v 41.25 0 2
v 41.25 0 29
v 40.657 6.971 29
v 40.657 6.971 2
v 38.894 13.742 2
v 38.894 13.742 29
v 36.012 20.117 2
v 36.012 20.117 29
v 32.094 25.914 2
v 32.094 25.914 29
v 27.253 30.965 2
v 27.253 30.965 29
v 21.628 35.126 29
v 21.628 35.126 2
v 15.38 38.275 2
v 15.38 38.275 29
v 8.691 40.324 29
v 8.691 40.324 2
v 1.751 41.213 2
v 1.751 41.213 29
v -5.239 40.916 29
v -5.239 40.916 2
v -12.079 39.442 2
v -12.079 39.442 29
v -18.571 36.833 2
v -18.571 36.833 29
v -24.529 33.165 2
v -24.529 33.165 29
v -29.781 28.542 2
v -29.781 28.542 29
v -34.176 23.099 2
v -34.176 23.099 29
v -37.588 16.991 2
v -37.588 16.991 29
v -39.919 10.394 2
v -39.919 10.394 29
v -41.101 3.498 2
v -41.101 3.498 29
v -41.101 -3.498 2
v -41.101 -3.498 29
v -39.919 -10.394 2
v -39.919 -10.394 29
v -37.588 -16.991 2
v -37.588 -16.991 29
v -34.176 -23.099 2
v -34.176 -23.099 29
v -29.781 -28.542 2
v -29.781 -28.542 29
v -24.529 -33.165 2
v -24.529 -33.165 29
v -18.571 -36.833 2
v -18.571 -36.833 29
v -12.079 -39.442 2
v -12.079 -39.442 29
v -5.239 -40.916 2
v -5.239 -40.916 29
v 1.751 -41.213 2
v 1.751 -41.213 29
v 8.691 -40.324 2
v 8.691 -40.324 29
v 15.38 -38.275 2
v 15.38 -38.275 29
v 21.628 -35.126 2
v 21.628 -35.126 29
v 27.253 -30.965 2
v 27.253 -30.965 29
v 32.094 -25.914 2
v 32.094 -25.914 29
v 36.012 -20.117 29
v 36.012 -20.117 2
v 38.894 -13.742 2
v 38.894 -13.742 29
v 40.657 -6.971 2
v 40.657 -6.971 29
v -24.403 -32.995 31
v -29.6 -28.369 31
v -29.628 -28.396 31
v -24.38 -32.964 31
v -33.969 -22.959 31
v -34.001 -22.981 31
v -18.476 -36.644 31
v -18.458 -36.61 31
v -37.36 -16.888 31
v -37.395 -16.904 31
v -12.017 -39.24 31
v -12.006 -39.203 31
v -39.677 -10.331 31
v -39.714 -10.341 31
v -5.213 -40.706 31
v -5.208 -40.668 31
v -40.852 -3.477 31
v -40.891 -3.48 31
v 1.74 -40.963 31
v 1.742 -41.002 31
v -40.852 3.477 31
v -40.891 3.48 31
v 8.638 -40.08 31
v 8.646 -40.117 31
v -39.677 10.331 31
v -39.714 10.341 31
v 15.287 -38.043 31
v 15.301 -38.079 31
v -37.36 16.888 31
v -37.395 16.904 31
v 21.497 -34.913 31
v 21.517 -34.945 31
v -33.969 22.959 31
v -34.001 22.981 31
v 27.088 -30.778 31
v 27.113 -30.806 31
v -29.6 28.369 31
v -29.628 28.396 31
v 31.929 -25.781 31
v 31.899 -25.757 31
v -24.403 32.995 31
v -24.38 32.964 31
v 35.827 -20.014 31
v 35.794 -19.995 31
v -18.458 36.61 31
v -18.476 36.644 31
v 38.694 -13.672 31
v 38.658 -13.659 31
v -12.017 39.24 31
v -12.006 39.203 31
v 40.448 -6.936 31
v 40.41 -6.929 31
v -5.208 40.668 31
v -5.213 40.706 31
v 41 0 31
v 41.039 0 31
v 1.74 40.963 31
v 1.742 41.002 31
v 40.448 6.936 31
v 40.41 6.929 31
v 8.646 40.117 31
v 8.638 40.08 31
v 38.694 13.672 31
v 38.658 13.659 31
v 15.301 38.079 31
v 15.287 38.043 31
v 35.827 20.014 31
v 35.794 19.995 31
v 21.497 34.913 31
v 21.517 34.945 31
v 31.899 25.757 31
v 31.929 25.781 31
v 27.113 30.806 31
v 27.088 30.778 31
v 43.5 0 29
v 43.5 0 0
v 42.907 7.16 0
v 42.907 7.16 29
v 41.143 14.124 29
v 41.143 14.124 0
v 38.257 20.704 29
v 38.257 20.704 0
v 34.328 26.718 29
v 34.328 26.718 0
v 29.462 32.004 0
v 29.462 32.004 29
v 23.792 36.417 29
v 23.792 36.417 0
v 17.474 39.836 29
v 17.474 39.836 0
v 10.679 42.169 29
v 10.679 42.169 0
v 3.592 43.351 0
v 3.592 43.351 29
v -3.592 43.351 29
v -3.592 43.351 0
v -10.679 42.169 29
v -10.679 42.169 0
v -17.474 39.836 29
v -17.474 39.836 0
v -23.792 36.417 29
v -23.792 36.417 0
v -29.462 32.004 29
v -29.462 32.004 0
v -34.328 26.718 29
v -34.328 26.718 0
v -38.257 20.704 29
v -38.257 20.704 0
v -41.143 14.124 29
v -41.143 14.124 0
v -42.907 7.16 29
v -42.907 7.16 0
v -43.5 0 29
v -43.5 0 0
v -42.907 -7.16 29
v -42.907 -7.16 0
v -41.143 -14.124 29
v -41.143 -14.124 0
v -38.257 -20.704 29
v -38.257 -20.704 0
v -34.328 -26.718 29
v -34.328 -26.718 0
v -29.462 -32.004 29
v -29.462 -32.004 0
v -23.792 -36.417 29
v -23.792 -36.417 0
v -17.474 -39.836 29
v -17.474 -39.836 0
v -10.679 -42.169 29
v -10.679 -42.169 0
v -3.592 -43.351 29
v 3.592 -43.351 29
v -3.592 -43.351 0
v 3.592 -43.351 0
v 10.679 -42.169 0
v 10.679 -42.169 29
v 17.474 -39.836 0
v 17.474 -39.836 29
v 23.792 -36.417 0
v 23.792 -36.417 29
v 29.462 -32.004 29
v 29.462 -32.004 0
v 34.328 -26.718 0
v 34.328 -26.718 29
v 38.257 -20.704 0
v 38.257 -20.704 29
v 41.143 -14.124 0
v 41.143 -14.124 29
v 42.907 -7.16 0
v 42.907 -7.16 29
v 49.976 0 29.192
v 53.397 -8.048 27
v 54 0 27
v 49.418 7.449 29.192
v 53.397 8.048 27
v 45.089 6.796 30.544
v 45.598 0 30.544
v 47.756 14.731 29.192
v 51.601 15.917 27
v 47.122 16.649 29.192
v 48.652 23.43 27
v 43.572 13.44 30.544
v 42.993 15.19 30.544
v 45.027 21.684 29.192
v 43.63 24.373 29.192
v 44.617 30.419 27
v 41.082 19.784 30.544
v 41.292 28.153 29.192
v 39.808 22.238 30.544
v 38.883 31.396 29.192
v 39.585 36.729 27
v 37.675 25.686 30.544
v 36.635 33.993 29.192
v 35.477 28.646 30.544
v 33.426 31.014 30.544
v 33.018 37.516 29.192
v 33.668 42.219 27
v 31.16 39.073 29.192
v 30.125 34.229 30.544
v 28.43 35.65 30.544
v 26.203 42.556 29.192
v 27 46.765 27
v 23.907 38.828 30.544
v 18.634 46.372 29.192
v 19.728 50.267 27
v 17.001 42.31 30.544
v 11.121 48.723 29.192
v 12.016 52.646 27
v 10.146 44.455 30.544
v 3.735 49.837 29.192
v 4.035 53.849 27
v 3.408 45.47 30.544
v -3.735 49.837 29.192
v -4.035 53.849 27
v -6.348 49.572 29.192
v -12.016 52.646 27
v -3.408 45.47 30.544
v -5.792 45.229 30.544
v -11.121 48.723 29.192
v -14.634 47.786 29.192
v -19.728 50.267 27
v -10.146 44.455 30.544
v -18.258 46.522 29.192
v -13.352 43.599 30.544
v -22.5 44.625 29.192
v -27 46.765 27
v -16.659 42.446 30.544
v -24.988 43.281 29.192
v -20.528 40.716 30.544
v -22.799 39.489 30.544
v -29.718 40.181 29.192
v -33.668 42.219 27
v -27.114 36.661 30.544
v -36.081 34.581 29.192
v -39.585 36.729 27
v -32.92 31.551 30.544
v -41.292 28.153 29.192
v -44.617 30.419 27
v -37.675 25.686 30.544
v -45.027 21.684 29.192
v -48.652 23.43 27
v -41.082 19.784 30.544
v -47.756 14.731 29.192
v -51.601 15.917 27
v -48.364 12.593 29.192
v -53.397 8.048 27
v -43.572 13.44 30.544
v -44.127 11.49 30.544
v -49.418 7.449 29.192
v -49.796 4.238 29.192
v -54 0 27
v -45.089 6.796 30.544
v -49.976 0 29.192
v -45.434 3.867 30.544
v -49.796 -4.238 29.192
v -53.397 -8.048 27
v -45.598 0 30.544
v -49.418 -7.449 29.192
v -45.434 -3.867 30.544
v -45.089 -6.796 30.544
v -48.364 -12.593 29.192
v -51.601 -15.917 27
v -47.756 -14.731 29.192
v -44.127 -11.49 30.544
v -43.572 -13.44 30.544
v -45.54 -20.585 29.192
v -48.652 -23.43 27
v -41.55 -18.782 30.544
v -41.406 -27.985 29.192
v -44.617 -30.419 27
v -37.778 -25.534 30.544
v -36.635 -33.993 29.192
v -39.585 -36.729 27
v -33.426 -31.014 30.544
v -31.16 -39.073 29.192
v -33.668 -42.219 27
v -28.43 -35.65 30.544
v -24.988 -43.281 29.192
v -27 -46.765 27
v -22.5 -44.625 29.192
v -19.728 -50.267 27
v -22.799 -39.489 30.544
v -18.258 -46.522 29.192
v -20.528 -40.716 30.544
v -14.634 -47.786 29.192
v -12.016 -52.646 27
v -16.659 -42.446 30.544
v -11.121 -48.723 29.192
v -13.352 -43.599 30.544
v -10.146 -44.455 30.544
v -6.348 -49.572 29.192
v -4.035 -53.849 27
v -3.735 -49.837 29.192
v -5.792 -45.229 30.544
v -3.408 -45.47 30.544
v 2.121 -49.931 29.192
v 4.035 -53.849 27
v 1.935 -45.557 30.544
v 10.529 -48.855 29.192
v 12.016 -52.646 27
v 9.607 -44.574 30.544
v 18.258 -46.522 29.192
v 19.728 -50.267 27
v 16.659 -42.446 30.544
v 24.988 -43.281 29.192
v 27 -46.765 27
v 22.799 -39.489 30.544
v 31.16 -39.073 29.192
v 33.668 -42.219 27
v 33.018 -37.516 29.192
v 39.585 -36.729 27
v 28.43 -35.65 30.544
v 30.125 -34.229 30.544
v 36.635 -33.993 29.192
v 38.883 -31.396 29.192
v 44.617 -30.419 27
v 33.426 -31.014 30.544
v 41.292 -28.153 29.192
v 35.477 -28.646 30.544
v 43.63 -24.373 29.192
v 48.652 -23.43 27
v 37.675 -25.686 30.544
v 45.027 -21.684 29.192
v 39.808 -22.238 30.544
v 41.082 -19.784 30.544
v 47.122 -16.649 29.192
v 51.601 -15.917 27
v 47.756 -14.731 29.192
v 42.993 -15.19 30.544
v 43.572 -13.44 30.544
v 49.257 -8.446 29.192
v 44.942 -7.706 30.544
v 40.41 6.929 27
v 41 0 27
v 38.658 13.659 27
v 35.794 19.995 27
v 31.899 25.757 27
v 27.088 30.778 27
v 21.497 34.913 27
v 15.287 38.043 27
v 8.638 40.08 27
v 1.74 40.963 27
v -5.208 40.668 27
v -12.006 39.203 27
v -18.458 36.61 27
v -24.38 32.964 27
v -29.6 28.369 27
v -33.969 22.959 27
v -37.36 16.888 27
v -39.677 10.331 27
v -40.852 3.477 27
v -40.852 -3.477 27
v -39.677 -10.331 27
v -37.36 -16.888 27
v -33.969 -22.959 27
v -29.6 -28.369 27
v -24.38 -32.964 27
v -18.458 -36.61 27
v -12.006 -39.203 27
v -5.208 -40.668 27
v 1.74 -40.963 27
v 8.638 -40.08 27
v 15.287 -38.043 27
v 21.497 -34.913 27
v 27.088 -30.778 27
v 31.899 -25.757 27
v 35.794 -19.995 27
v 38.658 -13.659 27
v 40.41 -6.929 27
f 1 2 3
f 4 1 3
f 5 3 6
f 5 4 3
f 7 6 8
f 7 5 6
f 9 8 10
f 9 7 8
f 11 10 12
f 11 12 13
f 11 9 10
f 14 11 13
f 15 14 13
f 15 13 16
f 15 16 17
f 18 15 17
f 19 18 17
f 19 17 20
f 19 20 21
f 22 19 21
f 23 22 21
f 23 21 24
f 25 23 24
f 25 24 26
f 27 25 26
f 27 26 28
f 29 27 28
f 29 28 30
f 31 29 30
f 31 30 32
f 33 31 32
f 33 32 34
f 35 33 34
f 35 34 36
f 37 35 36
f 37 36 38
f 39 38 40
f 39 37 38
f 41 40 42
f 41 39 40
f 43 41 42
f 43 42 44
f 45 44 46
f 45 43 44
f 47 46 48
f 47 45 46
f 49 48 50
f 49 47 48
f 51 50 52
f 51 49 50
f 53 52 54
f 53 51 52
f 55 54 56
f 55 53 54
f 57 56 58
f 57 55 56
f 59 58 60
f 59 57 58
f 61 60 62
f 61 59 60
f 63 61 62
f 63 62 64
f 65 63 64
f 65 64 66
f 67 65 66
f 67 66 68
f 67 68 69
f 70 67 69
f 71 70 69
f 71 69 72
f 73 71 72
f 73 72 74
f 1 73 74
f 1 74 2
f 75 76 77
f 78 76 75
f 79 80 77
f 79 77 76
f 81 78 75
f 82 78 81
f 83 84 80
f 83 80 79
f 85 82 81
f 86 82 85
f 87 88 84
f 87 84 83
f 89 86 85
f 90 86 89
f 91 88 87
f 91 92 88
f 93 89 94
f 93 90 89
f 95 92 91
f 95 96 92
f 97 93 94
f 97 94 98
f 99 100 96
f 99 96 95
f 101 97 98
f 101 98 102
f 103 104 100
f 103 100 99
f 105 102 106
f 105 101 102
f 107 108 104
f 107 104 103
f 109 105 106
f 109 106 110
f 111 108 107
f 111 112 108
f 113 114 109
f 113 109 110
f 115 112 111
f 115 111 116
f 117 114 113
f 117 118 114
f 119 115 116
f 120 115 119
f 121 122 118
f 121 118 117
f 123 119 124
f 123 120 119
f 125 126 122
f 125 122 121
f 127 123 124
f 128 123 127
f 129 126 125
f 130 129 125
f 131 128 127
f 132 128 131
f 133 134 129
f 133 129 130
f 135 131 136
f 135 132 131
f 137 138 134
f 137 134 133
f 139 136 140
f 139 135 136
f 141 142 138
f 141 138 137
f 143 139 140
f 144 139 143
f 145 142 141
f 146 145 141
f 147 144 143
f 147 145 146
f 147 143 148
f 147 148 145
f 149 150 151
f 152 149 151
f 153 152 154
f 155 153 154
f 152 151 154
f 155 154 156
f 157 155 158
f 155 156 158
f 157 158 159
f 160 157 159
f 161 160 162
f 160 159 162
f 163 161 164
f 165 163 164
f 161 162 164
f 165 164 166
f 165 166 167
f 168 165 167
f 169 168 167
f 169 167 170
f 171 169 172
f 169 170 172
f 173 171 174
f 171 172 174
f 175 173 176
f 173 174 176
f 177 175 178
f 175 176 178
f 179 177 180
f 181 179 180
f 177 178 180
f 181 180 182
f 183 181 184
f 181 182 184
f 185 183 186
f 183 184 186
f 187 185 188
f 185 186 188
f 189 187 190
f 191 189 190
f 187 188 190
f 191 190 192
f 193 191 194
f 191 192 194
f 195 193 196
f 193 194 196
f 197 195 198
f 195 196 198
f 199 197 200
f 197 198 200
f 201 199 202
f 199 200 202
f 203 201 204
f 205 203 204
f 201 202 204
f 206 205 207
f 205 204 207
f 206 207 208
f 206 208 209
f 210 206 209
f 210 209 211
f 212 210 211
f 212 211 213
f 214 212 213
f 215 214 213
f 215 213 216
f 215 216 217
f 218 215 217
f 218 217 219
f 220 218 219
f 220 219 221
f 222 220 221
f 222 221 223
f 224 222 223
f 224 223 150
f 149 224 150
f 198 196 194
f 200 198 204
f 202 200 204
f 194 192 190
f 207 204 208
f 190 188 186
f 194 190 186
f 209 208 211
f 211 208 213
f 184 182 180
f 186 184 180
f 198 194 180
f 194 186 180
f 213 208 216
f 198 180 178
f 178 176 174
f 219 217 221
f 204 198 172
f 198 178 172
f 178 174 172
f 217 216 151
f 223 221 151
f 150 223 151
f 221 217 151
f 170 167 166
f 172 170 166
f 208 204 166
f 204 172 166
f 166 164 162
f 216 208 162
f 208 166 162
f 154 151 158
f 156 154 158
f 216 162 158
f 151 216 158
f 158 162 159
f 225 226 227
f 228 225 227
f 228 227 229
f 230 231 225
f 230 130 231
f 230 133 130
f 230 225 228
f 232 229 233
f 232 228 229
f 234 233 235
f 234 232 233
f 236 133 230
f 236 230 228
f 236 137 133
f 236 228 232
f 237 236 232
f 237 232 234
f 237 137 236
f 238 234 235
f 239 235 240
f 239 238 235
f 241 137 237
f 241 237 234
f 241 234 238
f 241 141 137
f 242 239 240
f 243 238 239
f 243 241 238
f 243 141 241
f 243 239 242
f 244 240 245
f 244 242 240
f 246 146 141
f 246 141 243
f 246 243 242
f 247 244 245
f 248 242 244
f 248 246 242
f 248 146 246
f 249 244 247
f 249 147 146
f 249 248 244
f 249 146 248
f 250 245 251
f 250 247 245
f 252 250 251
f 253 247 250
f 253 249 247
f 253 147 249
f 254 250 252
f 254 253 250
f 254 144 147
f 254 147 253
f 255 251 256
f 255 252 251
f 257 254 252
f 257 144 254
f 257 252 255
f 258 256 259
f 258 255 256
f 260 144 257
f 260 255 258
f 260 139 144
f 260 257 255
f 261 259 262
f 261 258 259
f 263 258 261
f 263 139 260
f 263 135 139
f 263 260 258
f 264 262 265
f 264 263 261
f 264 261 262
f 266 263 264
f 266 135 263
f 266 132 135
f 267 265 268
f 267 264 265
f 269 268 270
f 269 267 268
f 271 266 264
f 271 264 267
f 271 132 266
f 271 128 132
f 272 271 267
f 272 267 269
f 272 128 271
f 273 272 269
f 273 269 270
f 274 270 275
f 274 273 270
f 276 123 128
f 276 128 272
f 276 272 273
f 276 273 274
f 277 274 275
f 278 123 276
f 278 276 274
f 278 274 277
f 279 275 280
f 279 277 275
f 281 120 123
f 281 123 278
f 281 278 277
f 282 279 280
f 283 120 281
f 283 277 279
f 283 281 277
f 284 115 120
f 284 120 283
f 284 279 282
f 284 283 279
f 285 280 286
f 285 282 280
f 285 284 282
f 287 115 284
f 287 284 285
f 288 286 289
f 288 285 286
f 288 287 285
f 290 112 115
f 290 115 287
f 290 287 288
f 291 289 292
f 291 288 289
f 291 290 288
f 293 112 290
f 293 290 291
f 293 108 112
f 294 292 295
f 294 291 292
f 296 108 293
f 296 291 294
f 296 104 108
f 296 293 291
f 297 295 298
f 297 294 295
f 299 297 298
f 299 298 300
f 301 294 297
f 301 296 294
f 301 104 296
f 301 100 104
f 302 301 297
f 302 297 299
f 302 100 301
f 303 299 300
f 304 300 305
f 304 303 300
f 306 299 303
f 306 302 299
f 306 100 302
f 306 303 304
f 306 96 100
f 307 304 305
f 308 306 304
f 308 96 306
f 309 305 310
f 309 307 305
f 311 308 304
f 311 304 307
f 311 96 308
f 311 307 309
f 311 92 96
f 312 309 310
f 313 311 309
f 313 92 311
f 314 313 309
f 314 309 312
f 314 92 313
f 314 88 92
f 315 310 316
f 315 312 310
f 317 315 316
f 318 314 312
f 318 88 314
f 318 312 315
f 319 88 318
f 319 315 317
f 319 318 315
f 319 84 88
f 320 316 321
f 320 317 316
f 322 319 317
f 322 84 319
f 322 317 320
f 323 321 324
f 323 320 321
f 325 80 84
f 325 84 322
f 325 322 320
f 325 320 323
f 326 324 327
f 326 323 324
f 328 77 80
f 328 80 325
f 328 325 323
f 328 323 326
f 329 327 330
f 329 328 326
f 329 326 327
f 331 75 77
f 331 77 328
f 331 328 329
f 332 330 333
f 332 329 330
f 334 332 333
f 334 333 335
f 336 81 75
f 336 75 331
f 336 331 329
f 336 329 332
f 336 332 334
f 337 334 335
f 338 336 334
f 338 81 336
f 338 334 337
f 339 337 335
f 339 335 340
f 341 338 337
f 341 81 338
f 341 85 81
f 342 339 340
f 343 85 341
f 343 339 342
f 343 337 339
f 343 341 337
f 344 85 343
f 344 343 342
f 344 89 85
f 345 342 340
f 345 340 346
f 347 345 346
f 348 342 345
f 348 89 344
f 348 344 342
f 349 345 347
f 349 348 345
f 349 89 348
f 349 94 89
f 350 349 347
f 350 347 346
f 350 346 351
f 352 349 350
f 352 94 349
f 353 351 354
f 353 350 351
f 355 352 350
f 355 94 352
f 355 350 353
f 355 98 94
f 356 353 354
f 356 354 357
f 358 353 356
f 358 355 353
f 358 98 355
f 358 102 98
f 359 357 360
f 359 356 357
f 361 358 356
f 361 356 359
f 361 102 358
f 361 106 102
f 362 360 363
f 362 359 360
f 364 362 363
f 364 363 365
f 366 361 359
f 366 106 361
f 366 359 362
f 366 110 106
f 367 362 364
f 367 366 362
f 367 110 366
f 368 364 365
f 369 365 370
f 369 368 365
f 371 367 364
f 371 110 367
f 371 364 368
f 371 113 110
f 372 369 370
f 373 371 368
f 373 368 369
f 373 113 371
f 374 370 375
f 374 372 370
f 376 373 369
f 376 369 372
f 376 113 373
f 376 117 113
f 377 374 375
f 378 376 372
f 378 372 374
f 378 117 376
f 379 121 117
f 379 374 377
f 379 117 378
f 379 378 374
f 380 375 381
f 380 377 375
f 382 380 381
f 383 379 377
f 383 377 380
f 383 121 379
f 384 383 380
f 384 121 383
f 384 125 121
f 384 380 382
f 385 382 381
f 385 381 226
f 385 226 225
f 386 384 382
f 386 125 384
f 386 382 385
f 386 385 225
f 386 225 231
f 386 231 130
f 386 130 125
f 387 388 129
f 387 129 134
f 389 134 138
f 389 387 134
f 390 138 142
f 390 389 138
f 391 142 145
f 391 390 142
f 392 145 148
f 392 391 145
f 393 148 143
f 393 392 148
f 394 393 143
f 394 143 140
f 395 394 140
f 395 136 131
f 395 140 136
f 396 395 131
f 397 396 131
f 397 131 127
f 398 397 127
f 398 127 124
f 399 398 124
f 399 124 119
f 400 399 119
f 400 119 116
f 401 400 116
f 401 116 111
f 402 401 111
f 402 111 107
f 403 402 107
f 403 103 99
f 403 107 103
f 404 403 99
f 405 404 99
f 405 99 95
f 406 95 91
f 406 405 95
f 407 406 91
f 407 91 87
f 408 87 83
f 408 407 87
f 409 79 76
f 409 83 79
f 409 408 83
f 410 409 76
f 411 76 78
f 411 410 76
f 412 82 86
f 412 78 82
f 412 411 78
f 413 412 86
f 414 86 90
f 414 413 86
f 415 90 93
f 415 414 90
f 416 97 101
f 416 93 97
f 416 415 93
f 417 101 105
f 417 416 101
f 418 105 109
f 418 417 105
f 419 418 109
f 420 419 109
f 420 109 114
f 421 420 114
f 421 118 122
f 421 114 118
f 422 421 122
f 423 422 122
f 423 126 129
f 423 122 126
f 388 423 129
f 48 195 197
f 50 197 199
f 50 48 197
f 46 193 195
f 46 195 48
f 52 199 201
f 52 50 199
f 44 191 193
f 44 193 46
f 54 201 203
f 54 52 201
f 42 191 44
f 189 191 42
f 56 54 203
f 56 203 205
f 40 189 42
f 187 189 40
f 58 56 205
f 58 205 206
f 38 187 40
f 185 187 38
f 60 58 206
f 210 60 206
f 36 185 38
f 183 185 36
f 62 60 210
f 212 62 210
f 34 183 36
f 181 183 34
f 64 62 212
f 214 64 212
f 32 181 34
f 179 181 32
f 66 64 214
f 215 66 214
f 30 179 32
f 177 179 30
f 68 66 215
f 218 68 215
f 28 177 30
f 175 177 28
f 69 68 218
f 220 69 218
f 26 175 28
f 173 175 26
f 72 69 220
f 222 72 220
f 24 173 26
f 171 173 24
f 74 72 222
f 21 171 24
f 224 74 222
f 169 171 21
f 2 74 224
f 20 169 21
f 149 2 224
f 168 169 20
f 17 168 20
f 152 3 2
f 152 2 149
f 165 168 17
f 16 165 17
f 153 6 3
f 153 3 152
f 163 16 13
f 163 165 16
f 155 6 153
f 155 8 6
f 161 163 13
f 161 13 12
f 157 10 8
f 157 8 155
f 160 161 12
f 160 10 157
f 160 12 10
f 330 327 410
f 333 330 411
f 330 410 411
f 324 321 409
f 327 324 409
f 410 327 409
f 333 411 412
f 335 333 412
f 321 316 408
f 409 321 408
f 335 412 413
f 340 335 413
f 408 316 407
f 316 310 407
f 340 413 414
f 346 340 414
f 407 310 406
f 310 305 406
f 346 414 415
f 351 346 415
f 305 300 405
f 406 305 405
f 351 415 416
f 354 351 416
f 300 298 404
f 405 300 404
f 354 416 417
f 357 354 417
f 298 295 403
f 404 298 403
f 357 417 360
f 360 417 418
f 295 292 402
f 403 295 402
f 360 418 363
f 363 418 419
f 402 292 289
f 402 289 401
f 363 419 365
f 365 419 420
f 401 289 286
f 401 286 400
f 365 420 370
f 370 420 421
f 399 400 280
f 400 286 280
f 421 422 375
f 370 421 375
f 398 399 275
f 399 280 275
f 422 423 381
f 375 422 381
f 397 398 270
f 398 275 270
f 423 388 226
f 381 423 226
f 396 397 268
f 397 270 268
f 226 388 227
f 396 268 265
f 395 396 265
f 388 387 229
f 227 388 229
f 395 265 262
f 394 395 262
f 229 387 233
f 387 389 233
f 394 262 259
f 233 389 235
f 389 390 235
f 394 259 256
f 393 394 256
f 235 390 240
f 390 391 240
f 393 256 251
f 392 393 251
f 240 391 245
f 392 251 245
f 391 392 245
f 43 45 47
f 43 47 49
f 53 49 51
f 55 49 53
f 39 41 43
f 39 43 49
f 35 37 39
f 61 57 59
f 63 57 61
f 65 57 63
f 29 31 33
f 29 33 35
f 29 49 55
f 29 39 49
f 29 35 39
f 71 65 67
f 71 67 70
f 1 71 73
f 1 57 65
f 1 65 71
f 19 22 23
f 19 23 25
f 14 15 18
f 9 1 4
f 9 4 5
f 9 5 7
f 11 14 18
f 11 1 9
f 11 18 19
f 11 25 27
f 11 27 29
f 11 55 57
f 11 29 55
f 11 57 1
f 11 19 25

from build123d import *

# Parameters (mm, degrees)
F0_R     = 43.5
F0_R_2   = 41.25
F1_DEPTH = 29
F2_DEPTH = 2
F3_R     = 54
F4_DEPTH = 2
F5_R     = 41
F6_DEPTH = 29.001


# Not quite as in the source:
# - a fillet or chamfer that OpenCascade refuses, or shapes differently, is made with other operations: its cross-section is extruded or revolved along the edge and cut away or added


with BuildPart() as f1:
    # F0 (on Top) → F1 (new body)
    with BuildSketch(Plane.XY):
        Circle(F0_R)
        Circle(F0_R_2, mode=Mode.SUBTRACT)
    extrude(amount=F1_DEPTH)

    # F0 (on Top) → F2 (join)
    with BuildSketch(Plane.XY):
        Circle(F0_R_2)
    extrude(amount=F2_DEPTH)


with BuildPart() as f4:
    # F3 (on face) → F4 (new body, symmetric)
    with BuildSketch(Plane.XY.offset(29)):
        Circle(F3_R)
    extrude(amount=F4_DEPTH, both=True)

    # F5 (on face) → F6 (cut, through all)
    with BuildSketch(Plane.XY.offset(2)):
        Circle(F5_R)
    extrude(amount=F6_DEPTH, mode=Mode.SUBTRACT)

    # F7: fillet of radius 23 on 1 edges, made by hand

    # F7_s1 → F7_t2 (revolve, cut)
    with BuildSketch(Plane.XZ):
        with BuildLine():
            ThreePointArc((54, 27), (47.8208485863, 29.9772609758), (41.0385186032, 31))
            Line((41.0385186032, 31), (41.0385186032, 31.46))
            Line((41.0385186032, 31.46), (54, 31.46))
            Line((54, 31.46), (54.46, 31))
            ThreePointArc((54.46, 31), (54.46, 29), (54.2592296279, 27.38))
            Line((54.2592296279, 27.38), (54, 27))
        make_face()
    revolve(axis=Axis((0, 0, 31), (0, 0, 1)), mode=Mode.SUBTRACT)


solid = Compound([f1.part, f4.part])
